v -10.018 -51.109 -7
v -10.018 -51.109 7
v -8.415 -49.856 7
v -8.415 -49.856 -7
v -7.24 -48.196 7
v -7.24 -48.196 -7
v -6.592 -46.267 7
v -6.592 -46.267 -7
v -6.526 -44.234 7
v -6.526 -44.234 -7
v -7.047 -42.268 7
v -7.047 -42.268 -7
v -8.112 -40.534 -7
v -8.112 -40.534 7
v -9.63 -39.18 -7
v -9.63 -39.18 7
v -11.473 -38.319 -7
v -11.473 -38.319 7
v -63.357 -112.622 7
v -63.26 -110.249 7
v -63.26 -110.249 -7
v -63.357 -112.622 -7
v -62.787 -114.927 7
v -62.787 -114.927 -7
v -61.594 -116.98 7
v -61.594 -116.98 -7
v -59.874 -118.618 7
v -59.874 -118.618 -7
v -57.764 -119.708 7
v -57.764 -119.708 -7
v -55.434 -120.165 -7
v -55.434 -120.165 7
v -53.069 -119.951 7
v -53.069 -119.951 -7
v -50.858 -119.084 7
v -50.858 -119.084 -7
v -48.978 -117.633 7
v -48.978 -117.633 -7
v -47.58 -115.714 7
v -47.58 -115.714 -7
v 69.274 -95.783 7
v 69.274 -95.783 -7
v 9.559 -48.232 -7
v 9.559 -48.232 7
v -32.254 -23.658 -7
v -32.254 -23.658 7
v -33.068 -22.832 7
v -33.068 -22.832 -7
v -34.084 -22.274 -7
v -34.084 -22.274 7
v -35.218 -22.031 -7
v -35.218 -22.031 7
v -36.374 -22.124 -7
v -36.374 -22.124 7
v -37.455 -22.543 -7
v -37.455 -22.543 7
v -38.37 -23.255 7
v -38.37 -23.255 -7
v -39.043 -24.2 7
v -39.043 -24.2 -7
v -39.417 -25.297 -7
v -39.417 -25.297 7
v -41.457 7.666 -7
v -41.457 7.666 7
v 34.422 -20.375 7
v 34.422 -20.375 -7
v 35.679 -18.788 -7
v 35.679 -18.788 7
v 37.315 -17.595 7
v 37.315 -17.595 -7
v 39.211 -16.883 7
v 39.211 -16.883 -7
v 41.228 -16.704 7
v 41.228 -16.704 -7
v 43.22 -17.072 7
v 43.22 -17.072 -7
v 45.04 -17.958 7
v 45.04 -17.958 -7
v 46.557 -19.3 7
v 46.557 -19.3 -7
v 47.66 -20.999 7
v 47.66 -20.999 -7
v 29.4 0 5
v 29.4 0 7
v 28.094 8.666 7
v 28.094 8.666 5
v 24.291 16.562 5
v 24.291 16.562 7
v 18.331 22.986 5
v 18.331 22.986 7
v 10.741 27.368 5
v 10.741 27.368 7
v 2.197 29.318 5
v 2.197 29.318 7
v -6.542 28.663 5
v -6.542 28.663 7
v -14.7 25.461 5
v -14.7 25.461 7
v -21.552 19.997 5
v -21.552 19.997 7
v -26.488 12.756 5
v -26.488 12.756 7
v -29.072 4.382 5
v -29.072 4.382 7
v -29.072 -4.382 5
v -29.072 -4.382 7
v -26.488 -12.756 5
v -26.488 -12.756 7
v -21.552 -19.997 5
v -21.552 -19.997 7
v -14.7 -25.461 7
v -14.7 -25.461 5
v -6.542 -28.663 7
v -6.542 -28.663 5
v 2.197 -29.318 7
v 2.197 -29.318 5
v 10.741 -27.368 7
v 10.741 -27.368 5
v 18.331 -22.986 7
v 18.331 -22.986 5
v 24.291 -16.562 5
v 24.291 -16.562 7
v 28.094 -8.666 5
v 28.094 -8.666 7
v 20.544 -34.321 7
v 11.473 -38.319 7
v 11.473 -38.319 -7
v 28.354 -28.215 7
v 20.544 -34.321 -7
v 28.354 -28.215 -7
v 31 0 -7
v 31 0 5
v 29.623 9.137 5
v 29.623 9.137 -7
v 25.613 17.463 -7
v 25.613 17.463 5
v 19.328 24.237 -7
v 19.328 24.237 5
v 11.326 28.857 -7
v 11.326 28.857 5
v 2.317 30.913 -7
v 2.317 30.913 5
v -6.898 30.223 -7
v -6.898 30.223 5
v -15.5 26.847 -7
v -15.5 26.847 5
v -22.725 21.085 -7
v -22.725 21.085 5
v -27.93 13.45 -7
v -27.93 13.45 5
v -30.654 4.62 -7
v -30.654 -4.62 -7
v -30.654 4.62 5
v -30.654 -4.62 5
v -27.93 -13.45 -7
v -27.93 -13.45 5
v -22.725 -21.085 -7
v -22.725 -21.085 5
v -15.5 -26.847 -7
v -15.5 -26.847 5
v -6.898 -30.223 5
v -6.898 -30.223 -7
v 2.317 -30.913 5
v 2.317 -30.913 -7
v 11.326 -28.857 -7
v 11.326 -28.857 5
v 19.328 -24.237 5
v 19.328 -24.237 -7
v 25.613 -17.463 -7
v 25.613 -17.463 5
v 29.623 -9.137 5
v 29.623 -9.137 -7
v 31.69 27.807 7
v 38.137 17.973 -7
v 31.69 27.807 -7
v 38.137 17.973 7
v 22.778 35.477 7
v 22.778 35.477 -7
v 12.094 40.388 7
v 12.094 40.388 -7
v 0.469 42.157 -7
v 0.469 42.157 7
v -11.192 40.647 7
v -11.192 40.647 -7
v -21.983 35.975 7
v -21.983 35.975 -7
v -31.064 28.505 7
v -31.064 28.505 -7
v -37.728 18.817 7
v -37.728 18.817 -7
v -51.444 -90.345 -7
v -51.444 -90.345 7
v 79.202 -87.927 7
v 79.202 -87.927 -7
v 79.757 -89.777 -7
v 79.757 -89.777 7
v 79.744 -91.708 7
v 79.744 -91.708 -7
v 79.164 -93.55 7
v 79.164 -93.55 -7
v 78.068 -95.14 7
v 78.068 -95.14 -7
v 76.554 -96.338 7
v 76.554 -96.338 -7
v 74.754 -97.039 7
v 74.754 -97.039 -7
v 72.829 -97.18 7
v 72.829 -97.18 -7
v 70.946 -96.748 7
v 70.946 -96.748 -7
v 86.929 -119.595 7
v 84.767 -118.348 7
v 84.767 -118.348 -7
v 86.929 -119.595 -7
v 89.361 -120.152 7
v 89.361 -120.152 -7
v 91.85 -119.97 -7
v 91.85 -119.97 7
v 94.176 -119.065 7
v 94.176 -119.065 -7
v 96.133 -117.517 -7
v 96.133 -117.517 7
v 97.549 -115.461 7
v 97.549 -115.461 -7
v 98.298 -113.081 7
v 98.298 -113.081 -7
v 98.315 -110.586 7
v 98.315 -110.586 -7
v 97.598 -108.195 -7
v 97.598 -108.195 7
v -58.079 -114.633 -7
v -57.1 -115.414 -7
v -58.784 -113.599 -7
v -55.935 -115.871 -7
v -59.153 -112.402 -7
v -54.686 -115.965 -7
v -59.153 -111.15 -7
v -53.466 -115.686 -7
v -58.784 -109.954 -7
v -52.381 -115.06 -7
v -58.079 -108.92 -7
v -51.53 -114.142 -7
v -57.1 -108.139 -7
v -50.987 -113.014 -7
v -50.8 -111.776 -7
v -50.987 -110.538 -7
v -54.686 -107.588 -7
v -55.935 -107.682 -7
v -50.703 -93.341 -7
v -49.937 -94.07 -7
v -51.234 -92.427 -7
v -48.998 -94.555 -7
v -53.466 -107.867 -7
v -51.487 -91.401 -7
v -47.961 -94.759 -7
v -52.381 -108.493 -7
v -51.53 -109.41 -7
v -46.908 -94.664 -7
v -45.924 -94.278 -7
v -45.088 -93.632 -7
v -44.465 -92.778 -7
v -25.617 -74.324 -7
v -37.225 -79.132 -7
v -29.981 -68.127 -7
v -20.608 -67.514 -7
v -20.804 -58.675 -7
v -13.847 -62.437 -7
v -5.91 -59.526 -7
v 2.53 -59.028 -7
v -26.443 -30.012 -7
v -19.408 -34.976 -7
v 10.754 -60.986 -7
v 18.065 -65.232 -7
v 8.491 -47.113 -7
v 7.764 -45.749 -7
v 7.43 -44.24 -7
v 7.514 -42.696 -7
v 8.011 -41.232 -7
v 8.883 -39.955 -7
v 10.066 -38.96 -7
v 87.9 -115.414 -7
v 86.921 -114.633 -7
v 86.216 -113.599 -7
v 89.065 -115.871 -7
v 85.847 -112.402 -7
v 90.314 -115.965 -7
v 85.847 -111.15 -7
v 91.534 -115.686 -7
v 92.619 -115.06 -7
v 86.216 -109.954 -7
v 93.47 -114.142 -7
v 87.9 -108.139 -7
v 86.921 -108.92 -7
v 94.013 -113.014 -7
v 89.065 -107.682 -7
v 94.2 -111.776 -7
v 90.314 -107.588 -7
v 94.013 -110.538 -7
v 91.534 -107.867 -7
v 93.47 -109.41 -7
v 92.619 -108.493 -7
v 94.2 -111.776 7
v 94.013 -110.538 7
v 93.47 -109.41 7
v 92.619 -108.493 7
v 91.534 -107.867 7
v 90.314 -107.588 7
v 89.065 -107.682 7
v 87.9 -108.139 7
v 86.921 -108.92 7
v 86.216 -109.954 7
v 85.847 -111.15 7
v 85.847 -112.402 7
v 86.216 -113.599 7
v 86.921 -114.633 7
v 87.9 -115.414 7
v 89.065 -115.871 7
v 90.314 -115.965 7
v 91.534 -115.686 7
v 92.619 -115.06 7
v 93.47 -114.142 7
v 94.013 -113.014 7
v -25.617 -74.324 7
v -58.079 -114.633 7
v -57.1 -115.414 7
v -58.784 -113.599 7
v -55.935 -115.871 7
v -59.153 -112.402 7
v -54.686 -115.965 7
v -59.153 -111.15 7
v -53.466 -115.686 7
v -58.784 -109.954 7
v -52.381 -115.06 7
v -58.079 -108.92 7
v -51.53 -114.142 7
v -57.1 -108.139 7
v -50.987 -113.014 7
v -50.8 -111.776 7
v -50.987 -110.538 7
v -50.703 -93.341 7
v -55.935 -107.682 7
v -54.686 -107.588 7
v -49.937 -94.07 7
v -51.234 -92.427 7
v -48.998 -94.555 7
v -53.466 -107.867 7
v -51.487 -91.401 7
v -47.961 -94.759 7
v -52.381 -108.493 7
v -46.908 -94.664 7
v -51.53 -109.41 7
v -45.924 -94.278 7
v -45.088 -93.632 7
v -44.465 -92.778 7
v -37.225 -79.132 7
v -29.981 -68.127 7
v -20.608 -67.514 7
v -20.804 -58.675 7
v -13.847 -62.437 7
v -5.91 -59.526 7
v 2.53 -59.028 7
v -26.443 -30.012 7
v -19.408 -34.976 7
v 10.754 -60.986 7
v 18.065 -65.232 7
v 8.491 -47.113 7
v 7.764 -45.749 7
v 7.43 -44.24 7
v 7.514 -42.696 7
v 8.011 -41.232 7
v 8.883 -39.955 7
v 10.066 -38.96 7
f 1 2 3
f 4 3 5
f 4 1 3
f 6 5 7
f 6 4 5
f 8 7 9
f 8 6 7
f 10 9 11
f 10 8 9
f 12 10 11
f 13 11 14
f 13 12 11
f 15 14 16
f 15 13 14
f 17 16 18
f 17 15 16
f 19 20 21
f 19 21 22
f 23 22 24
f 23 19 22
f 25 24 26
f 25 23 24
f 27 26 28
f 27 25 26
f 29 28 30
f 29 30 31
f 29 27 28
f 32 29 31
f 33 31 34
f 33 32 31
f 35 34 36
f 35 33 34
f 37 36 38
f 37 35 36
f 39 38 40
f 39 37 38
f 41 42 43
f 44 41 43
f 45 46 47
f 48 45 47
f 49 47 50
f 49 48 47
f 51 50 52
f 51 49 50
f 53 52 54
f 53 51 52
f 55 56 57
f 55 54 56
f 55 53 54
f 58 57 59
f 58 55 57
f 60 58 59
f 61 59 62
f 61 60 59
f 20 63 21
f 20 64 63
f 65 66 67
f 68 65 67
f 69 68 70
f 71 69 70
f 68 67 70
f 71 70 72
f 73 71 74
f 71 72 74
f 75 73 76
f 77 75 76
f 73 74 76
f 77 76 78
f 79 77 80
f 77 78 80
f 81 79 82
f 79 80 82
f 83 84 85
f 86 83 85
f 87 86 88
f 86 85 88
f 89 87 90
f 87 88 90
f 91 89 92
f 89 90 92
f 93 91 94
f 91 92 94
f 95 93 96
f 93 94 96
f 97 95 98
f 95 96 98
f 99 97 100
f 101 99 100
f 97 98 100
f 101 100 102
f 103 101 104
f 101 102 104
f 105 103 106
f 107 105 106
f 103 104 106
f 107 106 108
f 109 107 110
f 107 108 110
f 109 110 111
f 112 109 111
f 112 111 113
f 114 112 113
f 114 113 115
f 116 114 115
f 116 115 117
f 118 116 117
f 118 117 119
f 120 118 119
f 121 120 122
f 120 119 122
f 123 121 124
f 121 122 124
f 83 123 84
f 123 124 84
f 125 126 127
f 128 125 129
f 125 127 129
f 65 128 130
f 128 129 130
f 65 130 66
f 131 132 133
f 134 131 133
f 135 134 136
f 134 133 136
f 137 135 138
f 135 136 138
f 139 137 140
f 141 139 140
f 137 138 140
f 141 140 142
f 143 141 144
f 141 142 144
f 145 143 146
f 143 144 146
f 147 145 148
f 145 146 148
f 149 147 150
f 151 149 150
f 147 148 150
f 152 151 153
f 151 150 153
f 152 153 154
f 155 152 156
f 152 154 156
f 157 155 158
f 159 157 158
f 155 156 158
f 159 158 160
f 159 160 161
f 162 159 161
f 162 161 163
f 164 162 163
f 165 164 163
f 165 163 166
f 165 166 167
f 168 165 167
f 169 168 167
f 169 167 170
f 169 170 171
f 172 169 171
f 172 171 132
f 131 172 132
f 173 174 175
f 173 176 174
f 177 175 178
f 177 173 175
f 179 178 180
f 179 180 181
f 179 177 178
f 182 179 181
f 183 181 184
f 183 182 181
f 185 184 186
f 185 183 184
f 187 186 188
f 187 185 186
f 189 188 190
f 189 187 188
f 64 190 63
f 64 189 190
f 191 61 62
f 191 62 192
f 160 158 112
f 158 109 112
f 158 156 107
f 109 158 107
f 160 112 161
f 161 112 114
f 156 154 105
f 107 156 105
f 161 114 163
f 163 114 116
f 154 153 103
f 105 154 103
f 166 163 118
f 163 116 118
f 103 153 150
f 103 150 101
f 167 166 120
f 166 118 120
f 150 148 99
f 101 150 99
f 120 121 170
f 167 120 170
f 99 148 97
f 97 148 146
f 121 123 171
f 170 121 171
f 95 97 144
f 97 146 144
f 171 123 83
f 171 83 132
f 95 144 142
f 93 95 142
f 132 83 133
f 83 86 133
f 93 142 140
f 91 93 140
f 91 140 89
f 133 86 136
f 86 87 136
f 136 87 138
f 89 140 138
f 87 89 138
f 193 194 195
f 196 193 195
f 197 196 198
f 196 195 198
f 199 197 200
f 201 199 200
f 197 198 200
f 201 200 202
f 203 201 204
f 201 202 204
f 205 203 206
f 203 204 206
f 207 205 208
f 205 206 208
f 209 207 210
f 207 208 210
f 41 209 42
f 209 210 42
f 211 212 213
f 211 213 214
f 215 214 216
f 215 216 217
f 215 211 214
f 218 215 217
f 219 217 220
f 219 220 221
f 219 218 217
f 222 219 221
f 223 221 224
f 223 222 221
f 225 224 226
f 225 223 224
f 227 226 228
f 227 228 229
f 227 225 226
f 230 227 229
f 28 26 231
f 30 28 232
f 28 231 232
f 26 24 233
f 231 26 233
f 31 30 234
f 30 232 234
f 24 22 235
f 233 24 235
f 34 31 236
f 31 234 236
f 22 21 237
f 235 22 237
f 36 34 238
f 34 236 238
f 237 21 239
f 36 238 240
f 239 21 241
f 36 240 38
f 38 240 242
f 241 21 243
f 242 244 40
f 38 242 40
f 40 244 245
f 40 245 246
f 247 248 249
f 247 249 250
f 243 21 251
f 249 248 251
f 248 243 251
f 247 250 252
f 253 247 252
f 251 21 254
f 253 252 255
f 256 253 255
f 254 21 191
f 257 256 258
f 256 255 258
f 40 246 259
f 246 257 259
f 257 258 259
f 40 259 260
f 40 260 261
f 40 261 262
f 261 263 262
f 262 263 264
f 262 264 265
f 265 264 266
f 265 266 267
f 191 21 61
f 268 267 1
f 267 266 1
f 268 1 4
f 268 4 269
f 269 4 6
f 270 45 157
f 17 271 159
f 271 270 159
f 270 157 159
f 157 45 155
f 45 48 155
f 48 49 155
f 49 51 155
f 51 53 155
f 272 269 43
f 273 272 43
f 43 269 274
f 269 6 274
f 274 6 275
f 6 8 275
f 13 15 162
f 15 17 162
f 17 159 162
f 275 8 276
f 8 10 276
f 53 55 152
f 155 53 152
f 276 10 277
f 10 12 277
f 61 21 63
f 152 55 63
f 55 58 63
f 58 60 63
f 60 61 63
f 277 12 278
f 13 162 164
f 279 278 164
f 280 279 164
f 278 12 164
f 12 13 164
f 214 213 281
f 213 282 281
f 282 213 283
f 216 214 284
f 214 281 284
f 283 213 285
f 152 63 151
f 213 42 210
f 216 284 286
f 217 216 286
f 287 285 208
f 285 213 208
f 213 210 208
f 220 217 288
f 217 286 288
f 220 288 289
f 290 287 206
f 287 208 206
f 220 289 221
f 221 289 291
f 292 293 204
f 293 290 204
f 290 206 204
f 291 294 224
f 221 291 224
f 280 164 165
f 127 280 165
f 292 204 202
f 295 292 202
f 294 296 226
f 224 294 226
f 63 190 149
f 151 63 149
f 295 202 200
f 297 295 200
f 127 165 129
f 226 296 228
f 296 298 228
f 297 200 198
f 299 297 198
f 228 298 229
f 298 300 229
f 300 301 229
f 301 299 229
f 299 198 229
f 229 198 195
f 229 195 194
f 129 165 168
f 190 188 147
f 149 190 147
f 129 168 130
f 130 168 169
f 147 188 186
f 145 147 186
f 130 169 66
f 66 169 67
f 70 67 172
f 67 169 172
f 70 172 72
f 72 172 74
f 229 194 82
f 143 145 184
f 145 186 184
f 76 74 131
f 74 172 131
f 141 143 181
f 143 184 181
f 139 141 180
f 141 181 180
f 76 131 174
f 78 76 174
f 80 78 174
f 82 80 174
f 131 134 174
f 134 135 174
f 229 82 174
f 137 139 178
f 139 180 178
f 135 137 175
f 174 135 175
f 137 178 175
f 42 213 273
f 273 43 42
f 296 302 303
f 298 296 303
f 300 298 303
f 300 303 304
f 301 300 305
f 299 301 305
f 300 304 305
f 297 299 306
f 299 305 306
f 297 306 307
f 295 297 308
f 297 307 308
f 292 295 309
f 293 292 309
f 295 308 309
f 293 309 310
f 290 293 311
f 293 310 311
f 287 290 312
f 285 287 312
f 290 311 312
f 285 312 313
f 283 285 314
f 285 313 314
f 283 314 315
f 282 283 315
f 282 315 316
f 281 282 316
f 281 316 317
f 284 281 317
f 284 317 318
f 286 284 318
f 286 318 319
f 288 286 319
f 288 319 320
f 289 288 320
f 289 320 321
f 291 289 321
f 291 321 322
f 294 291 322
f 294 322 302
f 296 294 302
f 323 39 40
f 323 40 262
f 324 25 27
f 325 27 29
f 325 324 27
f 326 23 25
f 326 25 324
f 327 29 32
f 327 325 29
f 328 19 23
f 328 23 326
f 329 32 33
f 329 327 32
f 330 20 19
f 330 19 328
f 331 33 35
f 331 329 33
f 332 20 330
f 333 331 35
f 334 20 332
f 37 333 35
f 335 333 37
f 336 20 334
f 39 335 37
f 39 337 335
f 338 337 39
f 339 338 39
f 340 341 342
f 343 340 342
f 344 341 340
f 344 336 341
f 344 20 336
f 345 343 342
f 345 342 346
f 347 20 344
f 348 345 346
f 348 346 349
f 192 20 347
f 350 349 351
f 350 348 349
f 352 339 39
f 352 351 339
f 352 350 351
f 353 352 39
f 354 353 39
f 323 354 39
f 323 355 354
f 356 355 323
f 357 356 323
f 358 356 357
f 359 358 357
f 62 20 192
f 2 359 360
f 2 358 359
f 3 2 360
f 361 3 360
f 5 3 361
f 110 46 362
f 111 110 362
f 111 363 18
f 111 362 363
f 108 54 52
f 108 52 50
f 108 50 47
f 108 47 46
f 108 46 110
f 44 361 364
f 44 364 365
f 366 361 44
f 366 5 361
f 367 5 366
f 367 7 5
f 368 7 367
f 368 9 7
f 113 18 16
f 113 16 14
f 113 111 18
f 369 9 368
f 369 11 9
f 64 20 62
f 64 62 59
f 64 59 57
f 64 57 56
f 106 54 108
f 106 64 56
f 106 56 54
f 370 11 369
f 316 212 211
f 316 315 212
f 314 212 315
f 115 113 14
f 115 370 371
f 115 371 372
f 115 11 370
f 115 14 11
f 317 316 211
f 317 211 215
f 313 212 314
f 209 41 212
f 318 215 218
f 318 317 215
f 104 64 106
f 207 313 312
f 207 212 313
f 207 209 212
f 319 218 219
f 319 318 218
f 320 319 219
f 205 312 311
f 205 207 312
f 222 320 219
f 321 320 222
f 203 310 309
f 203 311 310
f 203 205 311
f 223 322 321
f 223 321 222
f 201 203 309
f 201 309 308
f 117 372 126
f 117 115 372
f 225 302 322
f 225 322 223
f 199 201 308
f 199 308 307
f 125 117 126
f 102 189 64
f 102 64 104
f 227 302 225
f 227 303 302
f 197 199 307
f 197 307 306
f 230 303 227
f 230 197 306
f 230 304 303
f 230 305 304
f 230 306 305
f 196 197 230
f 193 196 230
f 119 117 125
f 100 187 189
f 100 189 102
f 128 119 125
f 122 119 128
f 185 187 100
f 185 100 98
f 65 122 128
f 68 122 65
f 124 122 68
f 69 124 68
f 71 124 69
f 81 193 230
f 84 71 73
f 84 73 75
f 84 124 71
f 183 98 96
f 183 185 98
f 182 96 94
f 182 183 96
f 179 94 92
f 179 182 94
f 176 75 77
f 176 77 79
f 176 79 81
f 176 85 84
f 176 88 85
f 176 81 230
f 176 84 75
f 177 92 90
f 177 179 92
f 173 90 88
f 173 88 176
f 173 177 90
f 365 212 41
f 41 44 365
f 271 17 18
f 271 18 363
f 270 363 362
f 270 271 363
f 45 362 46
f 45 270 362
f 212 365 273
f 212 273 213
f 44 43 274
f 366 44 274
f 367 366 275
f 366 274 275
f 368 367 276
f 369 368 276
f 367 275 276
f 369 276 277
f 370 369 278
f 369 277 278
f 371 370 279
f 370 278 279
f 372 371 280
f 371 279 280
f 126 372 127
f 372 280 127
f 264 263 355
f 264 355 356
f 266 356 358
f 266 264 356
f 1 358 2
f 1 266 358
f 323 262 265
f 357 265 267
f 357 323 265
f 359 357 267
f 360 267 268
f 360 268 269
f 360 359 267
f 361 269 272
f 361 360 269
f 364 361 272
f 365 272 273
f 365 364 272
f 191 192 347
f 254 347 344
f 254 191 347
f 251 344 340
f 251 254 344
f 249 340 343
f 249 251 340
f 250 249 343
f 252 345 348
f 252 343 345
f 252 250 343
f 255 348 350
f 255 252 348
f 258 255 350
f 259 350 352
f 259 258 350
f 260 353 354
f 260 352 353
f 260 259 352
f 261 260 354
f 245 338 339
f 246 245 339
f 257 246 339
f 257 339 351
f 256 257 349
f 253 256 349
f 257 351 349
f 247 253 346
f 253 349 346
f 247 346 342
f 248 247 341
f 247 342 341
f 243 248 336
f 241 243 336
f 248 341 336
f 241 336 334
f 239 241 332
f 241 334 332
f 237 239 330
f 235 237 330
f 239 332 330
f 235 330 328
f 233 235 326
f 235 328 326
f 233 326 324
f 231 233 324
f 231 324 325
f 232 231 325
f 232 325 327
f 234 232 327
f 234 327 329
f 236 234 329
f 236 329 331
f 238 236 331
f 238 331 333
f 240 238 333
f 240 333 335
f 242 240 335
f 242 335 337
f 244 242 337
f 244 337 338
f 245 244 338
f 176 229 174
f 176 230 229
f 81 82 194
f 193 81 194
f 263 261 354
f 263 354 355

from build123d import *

# Parameters (mm, degrees)
BOSS_EXTRUDE1_DEPTH = 7
SKETCH3_R           = 4.2
SKETCH3_R_2         = 31
CUT_EXTRUDE1_DEPTH  = 156.951680739
SKETCH5_R           = 31
SKETCH5_R_2         = 29.4
BOSS_EXTRUDE3_DEPTH = 2
CUT_EXTRUDE3_DEPTH  = 156.951680739


with BuildPart() as part:
    # Sketch1 → Boss-Extrude1 (new, symmetric)
    with BuildSketch(Plane.XY):
        with BuildLine():
            Line((-41.457265734, 7.66555398), (-63.259986532, -110.249105832))
            ThreePointArc((-63.259986532, -110.249105832), (-57.764447863, -119.708474266), (-47.579981062, -115.713823794))
            Line((-47.579981062, -115.713823794), (-25.616732048, -74.324411645))
            ThreePointArc((-25.616732048, -74.324411645), (-5.909772036, -59.526451333), (18.065040544, -65.231910476))
            Line((18.065040544, -65.231910476), (84.767367566, -118.347513787))
            ThreePointArc((84.767367566, -118.347513787), (95.212080879, -118.36382677), (97.598433891, -108.195364664))
            Line((97.598433891, -108.195364664), (38.136901528, 17.973378699))
            ThreePointArc((38.136901528, 17.973378699), (-5.414703798, 41.810842885), (-41.457265734, 7.66555398))
        make_face()
    extrude(amount=BOSS_EXTRUDE1_DEPTH, both=True)

    # Sketch3 → Cut-Extrude1 (cut, through all)
    with BuildSketch(Plane.XY.offset(7)):
        with Locations((-55, -111.776398371)):
            Circle(SKETCH3_R)
        with Locations((90, -111.776398371)):
            Circle(SKETCH3_R)
        Circle(SKETCH3_R_2)
    extrude(amount=-CUT_EXTRUDE1_DEPTH, mode=Mode.SUBTRACT)

    # Sketch5 → Boss-Extrude3 (add)
    with BuildSketch(Plane.XY.offset(7)):
        Circle(SKETCH5_R)
        Circle(SKETCH5_R_2, mode=Mode.SUBTRACT)
    extrude(amount=-BOSS_EXTRUDE3_DEPTH)

    # Sketch7 → Cut-Extrude3 (cut, through all)
    with BuildSketch(Plane(origin=(0, 0, -7), x_dir=(-1, 0, 0), z_dir=(0, 0, -1))):
        with BuildLine():
            Line((39.416599892, -25.297435332), (51.444133318, -90.345395421))
            ThreePointArc((51.444133318, -90.345395421), (48.99824365, -94.555459787), (44.465461038, -92.777567771))
            Line((44.465461038, -92.777567771), (37.224653842, -79.132375609))
            ThreePointArc((37.224653842, -79.132375609), (25.615584401, -63.184563156), (10.018252925, -51.108700201))
            ThreePointArc((10.018252925, -51.108700201), (6.525820517, -44.233938334), (11.473159104, -38.319272177))
            ThreePointArc((11.473159104, -38.319272177), (23.05966211, -32.684124333), (32.253697166, -23.657958896))
            ThreePointArc((32.253697166, -23.657958896), (36.373945084, -22.123685051), (39.416599892, -25.297435332))
        make_face()
        with BuildLine():
            Line((-47.659866623, -20.998502649), (-79.20248655, -87.927365066))
            ThreePointArc((-79.20248655, -87.927365066), (-77.355903862, -95.795817886), (-69.273685228, -95.783194745))
            Line((-69.273685228, -95.783194745), (-9.558730446, -48.231692548))
            ThreePointArc((-9.558730446, -48.231692548), (-7.514321735, -42.69576591), (-11.473159104, -38.319272177))
            ThreePointArc((-11.473159104, -38.319272177), (-24.638900988, -31.510705453), (-34.421516336, -20.375456146))
            ThreePointArc((-34.421516336, -20.375456146), (-41.228138553, -16.704146639), (-47.659866623, -20.998502649))
        make_face()
    extrude(amount=-CUT_EXTRUDE3_DEPTH, mode=Mode.SUBTRACT)


solid = part.part
